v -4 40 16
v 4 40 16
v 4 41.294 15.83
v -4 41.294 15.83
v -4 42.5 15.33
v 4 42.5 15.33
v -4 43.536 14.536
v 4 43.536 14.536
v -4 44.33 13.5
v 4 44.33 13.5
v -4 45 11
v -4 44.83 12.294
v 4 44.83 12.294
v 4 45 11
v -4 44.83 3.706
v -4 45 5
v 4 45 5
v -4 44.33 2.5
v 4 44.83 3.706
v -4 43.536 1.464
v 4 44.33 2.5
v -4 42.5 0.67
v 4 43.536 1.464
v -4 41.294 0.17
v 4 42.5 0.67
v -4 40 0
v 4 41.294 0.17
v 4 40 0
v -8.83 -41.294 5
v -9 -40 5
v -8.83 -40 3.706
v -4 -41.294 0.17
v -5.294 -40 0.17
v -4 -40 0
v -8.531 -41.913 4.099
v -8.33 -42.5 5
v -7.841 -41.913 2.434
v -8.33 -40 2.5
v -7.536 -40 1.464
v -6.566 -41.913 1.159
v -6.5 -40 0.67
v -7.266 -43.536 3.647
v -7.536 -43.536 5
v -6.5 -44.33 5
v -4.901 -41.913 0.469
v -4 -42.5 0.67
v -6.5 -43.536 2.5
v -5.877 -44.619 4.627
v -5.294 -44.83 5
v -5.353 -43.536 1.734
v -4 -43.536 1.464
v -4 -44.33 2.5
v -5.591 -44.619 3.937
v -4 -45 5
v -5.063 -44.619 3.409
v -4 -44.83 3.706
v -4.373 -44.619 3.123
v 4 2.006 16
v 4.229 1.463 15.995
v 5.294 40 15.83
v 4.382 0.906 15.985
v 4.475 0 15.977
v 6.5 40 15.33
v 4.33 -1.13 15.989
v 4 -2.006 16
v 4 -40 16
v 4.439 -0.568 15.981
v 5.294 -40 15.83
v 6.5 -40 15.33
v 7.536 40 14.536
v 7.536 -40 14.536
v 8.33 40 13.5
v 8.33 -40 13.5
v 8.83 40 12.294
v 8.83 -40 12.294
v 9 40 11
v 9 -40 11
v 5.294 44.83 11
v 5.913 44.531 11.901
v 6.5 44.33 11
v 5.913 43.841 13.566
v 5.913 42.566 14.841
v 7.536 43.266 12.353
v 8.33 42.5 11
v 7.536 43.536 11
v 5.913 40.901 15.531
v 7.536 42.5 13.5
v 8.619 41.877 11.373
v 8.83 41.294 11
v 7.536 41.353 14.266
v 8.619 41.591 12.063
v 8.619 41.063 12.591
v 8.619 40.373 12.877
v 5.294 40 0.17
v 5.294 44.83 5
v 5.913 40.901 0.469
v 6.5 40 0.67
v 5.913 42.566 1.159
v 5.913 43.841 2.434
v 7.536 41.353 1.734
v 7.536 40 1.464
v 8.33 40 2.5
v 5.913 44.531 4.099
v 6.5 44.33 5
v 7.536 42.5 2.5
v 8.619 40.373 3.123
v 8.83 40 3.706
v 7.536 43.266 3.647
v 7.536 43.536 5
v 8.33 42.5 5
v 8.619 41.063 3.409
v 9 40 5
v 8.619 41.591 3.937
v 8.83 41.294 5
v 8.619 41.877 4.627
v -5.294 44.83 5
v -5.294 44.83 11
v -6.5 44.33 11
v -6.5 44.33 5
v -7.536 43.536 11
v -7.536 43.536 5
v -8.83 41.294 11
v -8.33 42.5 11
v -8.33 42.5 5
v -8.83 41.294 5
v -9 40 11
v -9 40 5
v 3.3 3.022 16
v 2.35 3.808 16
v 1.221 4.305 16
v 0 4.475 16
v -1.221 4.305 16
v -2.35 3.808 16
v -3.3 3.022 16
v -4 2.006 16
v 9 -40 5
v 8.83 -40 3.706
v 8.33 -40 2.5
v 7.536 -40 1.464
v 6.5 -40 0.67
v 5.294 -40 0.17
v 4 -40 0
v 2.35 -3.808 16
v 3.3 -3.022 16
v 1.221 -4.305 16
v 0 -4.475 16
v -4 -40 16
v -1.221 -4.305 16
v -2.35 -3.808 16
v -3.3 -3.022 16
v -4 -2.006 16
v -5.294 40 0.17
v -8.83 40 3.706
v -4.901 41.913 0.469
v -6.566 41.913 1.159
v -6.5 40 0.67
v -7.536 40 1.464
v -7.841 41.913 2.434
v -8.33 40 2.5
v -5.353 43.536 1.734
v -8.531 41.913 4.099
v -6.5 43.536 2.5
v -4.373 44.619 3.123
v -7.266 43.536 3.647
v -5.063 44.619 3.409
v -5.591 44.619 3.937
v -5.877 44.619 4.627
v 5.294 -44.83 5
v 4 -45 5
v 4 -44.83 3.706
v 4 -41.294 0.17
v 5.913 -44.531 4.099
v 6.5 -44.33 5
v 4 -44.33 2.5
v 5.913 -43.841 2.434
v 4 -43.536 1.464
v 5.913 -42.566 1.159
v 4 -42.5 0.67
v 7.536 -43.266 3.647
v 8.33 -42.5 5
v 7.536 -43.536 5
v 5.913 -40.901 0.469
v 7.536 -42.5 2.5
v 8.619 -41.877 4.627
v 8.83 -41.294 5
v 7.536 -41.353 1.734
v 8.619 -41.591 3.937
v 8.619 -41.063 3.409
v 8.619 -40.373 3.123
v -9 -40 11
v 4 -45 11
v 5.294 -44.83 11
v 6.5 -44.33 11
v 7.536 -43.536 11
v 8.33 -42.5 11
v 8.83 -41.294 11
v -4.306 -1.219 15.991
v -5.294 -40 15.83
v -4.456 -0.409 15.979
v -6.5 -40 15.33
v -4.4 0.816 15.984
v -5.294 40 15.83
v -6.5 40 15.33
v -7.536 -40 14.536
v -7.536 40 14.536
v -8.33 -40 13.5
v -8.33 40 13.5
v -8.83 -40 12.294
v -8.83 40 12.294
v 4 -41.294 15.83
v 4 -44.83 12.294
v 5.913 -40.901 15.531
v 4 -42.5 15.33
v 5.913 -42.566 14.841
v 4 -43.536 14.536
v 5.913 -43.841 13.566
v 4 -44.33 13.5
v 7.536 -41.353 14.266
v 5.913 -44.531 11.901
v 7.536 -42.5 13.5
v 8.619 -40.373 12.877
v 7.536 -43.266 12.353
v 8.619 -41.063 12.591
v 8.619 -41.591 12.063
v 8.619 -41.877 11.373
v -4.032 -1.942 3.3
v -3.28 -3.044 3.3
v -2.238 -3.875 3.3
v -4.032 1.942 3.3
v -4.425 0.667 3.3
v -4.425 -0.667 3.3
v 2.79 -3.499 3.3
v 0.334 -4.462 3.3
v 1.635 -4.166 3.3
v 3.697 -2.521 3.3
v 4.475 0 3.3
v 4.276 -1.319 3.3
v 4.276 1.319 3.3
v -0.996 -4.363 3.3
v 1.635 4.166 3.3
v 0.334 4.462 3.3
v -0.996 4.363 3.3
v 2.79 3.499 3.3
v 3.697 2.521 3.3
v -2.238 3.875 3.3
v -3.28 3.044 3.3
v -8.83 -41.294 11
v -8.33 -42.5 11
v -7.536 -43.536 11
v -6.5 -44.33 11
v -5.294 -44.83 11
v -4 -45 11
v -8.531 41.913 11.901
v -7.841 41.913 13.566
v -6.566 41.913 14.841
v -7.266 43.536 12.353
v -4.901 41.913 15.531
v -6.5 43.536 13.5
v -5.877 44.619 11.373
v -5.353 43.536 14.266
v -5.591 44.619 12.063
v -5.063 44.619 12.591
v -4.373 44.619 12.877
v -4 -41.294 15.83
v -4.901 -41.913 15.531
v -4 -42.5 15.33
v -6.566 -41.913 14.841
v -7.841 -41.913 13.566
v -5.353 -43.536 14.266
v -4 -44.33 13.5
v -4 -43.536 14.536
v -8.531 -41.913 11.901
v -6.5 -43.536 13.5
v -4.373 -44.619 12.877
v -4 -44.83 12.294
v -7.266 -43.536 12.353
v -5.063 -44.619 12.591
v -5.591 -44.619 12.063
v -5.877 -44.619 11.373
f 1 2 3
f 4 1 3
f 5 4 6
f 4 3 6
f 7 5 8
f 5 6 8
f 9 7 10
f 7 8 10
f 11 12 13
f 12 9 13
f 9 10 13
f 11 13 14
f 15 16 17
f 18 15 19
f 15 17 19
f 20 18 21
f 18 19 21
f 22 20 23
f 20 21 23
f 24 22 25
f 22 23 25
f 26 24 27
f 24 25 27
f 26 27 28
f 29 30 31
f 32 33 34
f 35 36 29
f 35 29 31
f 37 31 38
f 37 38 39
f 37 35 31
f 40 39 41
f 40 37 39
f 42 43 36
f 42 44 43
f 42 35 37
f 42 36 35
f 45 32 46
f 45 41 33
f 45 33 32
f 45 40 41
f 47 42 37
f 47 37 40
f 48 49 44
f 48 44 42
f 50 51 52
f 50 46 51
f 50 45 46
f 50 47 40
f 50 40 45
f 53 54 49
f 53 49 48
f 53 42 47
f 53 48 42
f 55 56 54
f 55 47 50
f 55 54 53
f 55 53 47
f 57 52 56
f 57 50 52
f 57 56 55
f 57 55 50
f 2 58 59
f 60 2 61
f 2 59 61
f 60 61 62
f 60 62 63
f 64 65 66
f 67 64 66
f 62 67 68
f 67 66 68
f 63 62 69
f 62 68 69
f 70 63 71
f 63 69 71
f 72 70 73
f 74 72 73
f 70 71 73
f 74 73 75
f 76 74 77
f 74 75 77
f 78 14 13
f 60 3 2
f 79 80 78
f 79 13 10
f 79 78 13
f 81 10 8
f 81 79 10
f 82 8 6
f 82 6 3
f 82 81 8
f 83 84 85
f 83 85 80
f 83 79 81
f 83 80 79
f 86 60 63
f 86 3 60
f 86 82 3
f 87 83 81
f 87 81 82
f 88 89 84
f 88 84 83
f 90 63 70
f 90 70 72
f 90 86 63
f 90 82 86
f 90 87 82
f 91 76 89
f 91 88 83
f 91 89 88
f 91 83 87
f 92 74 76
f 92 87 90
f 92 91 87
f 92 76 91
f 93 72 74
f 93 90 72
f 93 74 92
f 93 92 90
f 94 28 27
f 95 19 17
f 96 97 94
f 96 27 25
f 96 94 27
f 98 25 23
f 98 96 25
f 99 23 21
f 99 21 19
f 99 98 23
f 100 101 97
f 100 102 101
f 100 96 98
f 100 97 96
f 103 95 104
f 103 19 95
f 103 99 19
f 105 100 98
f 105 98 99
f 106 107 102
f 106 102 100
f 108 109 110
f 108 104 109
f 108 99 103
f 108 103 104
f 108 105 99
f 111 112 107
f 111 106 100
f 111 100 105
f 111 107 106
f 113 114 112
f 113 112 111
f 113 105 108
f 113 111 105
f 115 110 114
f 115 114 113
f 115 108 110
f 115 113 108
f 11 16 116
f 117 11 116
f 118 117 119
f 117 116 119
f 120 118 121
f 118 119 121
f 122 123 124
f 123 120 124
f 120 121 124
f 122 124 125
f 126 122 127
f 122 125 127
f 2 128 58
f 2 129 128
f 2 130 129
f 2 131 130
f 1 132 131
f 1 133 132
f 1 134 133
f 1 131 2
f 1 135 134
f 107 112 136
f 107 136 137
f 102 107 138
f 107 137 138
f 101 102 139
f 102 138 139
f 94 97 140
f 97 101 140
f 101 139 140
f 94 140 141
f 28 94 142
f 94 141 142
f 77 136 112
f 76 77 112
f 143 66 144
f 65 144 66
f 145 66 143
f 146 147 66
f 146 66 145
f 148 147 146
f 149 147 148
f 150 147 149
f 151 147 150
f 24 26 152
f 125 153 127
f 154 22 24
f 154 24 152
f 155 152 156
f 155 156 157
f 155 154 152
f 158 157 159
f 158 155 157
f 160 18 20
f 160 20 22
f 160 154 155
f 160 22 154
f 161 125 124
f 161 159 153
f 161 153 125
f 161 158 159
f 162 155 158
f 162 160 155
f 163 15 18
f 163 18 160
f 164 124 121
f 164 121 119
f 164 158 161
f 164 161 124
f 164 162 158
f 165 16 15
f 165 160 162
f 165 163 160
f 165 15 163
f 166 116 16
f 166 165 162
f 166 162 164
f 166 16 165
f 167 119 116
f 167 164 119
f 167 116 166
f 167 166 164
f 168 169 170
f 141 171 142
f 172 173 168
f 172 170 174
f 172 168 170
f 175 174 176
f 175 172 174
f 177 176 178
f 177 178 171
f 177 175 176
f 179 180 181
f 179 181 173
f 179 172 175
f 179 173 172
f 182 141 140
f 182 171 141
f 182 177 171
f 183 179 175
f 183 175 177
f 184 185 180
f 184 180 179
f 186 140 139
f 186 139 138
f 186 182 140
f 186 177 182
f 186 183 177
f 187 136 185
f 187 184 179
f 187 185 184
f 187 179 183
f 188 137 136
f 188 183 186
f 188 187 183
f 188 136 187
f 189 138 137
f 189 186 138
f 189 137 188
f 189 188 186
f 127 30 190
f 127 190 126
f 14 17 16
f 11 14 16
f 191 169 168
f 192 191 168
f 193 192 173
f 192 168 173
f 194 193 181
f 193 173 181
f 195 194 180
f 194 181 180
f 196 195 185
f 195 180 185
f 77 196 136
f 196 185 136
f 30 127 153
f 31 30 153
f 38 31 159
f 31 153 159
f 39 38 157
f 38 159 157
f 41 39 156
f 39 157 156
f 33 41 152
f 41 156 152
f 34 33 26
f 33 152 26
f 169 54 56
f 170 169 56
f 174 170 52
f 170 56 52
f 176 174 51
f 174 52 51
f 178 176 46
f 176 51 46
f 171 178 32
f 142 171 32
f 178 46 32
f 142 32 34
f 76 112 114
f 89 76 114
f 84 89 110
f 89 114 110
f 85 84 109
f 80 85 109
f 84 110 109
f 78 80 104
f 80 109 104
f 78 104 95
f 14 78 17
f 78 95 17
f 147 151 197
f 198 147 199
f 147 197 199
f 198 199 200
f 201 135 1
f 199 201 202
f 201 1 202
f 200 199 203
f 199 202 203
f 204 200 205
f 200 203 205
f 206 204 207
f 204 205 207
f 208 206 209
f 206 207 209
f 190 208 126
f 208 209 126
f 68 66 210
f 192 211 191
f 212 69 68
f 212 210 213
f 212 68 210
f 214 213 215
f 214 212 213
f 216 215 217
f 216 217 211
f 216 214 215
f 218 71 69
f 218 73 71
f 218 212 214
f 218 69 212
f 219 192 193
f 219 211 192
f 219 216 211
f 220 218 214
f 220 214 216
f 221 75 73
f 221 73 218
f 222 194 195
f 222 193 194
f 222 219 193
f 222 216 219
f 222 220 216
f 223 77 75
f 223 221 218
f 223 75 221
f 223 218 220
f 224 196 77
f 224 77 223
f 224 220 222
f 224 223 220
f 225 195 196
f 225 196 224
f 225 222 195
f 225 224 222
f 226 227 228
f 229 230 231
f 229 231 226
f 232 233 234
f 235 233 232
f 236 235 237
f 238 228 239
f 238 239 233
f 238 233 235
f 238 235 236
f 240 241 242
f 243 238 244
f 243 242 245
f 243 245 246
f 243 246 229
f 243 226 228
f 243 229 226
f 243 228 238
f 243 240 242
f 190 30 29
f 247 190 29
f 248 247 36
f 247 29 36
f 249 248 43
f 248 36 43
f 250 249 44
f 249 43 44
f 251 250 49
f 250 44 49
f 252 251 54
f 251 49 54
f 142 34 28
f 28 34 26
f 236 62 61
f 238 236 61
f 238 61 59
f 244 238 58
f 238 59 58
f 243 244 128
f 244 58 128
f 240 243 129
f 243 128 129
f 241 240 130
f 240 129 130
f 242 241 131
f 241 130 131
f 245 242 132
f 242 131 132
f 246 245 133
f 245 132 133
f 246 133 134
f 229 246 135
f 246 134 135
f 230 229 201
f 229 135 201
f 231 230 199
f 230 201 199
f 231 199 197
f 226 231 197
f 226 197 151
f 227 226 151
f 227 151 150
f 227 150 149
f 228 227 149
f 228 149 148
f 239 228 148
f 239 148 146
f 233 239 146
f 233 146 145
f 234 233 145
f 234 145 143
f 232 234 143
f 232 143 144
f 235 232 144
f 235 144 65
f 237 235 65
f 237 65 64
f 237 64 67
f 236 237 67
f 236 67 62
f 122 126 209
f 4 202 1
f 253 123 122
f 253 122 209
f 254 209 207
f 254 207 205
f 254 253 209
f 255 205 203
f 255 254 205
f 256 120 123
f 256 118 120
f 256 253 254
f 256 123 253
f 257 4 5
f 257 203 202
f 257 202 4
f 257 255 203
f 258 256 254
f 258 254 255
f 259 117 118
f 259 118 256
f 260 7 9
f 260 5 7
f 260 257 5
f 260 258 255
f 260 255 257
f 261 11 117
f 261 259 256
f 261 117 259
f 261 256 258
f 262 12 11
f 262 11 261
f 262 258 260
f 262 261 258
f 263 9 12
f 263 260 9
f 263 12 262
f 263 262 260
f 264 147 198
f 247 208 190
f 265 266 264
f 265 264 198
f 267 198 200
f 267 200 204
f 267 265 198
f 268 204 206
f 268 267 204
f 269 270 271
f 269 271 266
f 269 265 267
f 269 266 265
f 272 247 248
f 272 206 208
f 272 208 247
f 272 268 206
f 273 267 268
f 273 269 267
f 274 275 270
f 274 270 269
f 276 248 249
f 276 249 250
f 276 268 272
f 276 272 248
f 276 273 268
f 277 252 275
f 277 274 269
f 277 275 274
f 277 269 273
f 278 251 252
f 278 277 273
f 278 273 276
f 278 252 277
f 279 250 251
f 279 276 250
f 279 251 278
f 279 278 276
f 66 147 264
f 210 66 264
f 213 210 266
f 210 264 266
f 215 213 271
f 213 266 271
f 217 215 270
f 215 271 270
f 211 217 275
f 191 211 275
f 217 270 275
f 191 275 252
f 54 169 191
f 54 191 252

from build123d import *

# Parameters (mm, degrees)
SKETCH7_W           = 90
SKETCH7_H           = 18
BOSS_EXTRUDE1_DEPTH = 16
SKETCH8_R           = 4.475
CUT_EXTRUDE2_DEPTH  = 12.7
FILLET1_R           = 5


with BuildPart() as part:
    # Sketch7 → Boss-Extrude1 (new body)
    with BuildSketch(Plane(origin=(0, 0, 0), x_dir=(0, 1, 0), z_dir=(0, 0, 1))):
        Rectangle(SKETCH7_W, SKETCH7_H)
    extrude(amount=BOSS_EXTRUDE1_DEPTH)

    # Sketch8 → Cut-Extrude2 (cut)
    with BuildSketch(Plane(origin=(0, 0, 16), x_dir=(0, -1, 0), z_dir=(0, 0, 1))):
        with Locations(Location((0, 0, 0), (0, 0, 90))):
            Circle(SKETCH8_R)
    extrude(amount=-CUT_EXTRUDE2_DEPTH, mode=Mode.SUBTRACT)

    # Fillet1
    # the kernel refuses this fillet: 5 mm, written as the material it takes off along each edge
    with BuildSketch(Plane(origin=(-4, -40, 11), x_dir=(0, 0, 1), z_dir=(0, -1, 0))) as fillet1_piece_1_section:
        Polygon((0, 0), (FILLET1_R, 0), (FILLET1_R, FILLET1_R), (0, FILLET1_R), align=None)
    fillet1_piece_1 = extrude(amount=FILLET1_R, mode=Mode.PRIVATE)
    fillet1_piece_1 = fillet1_piece_1 - Plane(origin=(-4, -40, 11), x_dir=(0.7071067811865475, 0, -0.7071067811865475), z_dir=(0, -1, 0)) * Sphere(FILLET1_R, mode=Mode.PRIVATE)
    add(fillet1_piece_1, mode=Mode.SUBTRACT)
    with BuildSketch(Plane(origin=(4, -40, 11), x_dir=(0, -1, 0), z_dir=(1, 0, 0))) as fillet1_piece_2_section:
        Polygon((0, 0), (FILLET1_R, 0), (FILLET1_R, -FILLET1_R), (0, -FILLET1_R), align=None)
    fillet1_piece_2 = extrude(amount=FILLET1_R, mode=Mode.PRIVATE)
    fillet1_piece_2 = fillet1_piece_2 - Plane(origin=(4, -40, 11), x_dir=(0, 0.7071067811865475, -0.7071067811865475), z_dir=(1, 0, 0)) * Sphere(FILLET1_R, mode=Mode.PRIVATE)
    add(fillet1_piece_2, mode=Mode.SUBTRACT)
    with BuildSketch(Plane(origin=(4, 40, 11), x_dir=(0, 1, 0), z_dir=(1, 0, 0))) as fillet1_piece_3_section:
        Polygon((0, 0), (FILLET1_R, 0), (FILLET1_R, FILLET1_R), (0, FILLET1_R), align=None)
    fillet1_piece_3 = extrude(amount=FILLET1_R, mode=Mode.PRIVATE)
    fillet1_piece_3 = fillet1_piece_3 - Plane(origin=(4, 40, 11), x_dir=(0, -0.7071067811865475, -0.7071067811865475), z_dir=(1, 0, 0)) * Sphere(FILLET1_R, mode=Mode.PRIVATE)
    add(fillet1_piece_3, mode=Mode.SUBTRACT)
    with BuildSketch(Plane(origin=(-4, 40, 11), x_dir=(0, 0, 1), z_dir=(0, 1, 0))) as fillet1_piece_4_section:
        Polygon((0, 0), (FILLET1_R, 0), (FILLET1_R, -FILLET1_R), (0, -FILLET1_R), align=None)
    fillet1_piece_4 = extrude(amount=FILLET1_R, mode=Mode.PRIVATE)
    fillet1_piece_4 = fillet1_piece_4 - Plane(origin=(-4, 40, 11), x_dir=(0.7071067811865475, 0, -0.7071067811865475), z_dir=(0, 1, 0)) * Sphere(FILLET1_R, mode=Mode.PRIVATE)
    add(fillet1_piece_4, mode=Mode.SUBTRACT)
    with BuildSketch(Plane(origin=(4, -40, 5), x_dir=(0, -1, 0), z_dir=(1, 0, 0))) as fillet1_piece_5_section:
        Polygon((0, 0), (FILLET1_R, 0), (FILLET1_R, FILLET1_R), (0, FILLET1_R), align=None)
    fillet1_piece_5 = extrude(amount=FILLET1_R, mode=Mode.PRIVATE)
    fillet1_piece_5 = fillet1_piece_5 - Plane(origin=(4, -40, 5), x_dir=(0, 0.7071067811865475, 0.7071067811865475), z_dir=(1, 0, 0)) * Sphere(FILLET1_R, mode=Mode.PRIVATE)
    add(fillet1_piece_5, mode=Mode.SUBTRACT)
    with BuildSketch(Plane(origin=(4, 40, 5), x_dir=(0, 1, 0), z_dir=(1, 0, 0))) as fillet1_piece_6_section:
        Polygon((0, 0), (FILLET1_R, 0), (FILLET1_R, -FILLET1_R), (0, -FILLET1_R), align=None)
    fillet1_piece_6 = extrude(amount=FILLET1_R, mode=Mode.PRIVATE)
    fillet1_piece_6 = fillet1_piece_6 - Plane(origin=(4, 40, 5), x_dir=(0, -0.7071067811865475, 0.7071067811865475), z_dir=(1, 0, 0)) * Sphere(FILLET1_R, mode=Mode.PRIVATE)
    add(fillet1_piece_6, mode=Mode.SUBTRACT)
    with BuildSketch(Plane(origin=(-4, -40, 5), x_dir=(0, 0, -1), z_dir=(0, -1, 0))) as fillet1_piece_7_section:
        Polygon((0, 0), (FILLET1_R, 0), (FILLET1_R, -FILLET1_R), (0, -FILLET1_R), align=None)
    fillet1_piece_7 = extrude(amount=FILLET1_R, mode=Mode.PRIVATE)
    fillet1_piece_7 = fillet1_piece_7 - Plane(origin=(-4, -40, 5), x_dir=(0.7071067811865475, 0, 0.7071067811865475), z_dir=(0, -1, 0)) * Sphere(FILLET1_R, mode=Mode.PRIVATE)
    add(fillet1_piece_7, mode=Mode.SUBTRACT)
    with BuildSketch(Plane(origin=(-4, 40, 5), x_dir=(0, 0, -1), z_dir=(0, 1, 0))) as fillet1_piece_8_section:
        Polygon((0, 0), (FILLET1_R, 0), (FILLET1_R, FILLET1_R), (0, FILLET1_R), align=None)
    fillet1_piece_8 = extrude(amount=FILLET1_R, mode=Mode.PRIVATE)
    fillet1_piece_8 = fillet1_piece_8 - Plane(origin=(-4, 40, 5), x_dir=(0.7071067811865475, 0, 0.7071067811865475), z_dir=(0, 1, 0)) * Sphere(FILLET1_R, mode=Mode.PRIVATE)
    add(fillet1_piece_8, mode=Mode.SUBTRACT)
    with BuildSketch(Plane(origin=(-4, -45, 16), x_dir=(0, 0, -1), z_dir=(1, 0, 0)), Plane(origin=(4, 45, 16), x_dir=(0, 0, -1), z_dir=(-1, 0, 0))) as fillet1_piece_9:
        with BuildLine():
            CenterArc((FILLET1_R, FILLET1_R), FILLET1_R, 180, 90)
            Line((0, FILLET1_R), (0, 0))
            Line((0, 0), (FILLET1_R, 0))
        make_face()
    extrude(amount=8, mode=Mode.SUBTRACT)
    with BuildSketch(Plane(origin=(9, -40, 16), x_dir=(0, 0, -1), z_dir=(0, 1, 0)), Plane(origin=(-9, 40, 0), x_dir=(1, 0, 0), z_dir=(0, -1, 0))) as fillet1_piece_10:
        with BuildLine():
            CenterArc((FILLET1_R, FILLET1_R), FILLET1_R, 180, 90)
            Line((0, FILLET1_R), (0, 0))
            Line((0, 0), (FILLET1_R, 0))
        make_face()
    extrude(amount=80, mode=Mode.SUBTRACT)
    with BuildSketch(Plane(origin=(9, -40, 0), x_dir=(0, 0, 1), z_dir=(0, 1, 0)), Plane(origin=(-9, 40, 16), x_dir=(1, 0, 0), z_dir=(0, -1, 0))) as fillet1_piece_11:
        with BuildLine():
            CenterArc((FILLET1_R, -FILLET1_R), FILLET1_R, 90, 90)
            Line((0, -FILLET1_R), (0, 0))
            Line((0, 0), (FILLET1_R, 0))
        make_face()
    extrude(amount=80, mode=Mode.SUBTRACT)
    with BuildSketch(Plane(origin=(-4, -45, 0), x_dir=(0, 0, 1), z_dir=(1, 0, 0)), Plane(origin=(4, 45, 0), x_dir=(0, 0, 1), z_dir=(-1, 0, 0))) as fillet1_piece_12:
        with BuildLine():
            CenterArc((FILLET1_R, -FILLET1_R), FILLET1_R, 90, 90)
            Line((0, -FILLET1_R), (0, 0))
            Line((0, 0), (FILLET1_R, 0))
        make_face()
    extrude(amount=8, mode=Mode.SUBTRACT)
    with BuildSketch(Plane(origin=(9, 45, 5), x_dir=(0, -1, 0), z_dir=(0, 0, 1)), Plane(origin=(-9, 45, 5), x_dir=(1, 0, 0), z_dir=(0, 0, 1))) as fillet1_piece_13:
        with BuildLine():
            CenterArc((FILLET1_R, -FILLET1_R), FILLET1_R, 90, 90)
            Line((0, -FILLET1_R), (0, 0))
            Line((0, 0), (FILLET1_R, 0))
        make_face()
    extrude(amount=6, mode=Mode.SUBTRACT)
    with BuildSketch(Plane(origin=(9, -45, 5), x_dir=(0, 1, 0), z_dir=(0, 0, 1)), Plane(origin=(-9, -45, 5), x_dir=(1, 0, 0), z_dir=(0, 0, 1))) as fillet1_piece_14:
        with BuildLine():
            CenterArc((FILLET1_R, FILLET1_R), FILLET1_R, 180, 90)
            Line((0, FILLET1_R), (0, 0))
            Line((0, 0), (FILLET1_R, 0))
        make_face()
    extrude(amount=6, mode=Mode.SUBTRACT)


solid = part.part
